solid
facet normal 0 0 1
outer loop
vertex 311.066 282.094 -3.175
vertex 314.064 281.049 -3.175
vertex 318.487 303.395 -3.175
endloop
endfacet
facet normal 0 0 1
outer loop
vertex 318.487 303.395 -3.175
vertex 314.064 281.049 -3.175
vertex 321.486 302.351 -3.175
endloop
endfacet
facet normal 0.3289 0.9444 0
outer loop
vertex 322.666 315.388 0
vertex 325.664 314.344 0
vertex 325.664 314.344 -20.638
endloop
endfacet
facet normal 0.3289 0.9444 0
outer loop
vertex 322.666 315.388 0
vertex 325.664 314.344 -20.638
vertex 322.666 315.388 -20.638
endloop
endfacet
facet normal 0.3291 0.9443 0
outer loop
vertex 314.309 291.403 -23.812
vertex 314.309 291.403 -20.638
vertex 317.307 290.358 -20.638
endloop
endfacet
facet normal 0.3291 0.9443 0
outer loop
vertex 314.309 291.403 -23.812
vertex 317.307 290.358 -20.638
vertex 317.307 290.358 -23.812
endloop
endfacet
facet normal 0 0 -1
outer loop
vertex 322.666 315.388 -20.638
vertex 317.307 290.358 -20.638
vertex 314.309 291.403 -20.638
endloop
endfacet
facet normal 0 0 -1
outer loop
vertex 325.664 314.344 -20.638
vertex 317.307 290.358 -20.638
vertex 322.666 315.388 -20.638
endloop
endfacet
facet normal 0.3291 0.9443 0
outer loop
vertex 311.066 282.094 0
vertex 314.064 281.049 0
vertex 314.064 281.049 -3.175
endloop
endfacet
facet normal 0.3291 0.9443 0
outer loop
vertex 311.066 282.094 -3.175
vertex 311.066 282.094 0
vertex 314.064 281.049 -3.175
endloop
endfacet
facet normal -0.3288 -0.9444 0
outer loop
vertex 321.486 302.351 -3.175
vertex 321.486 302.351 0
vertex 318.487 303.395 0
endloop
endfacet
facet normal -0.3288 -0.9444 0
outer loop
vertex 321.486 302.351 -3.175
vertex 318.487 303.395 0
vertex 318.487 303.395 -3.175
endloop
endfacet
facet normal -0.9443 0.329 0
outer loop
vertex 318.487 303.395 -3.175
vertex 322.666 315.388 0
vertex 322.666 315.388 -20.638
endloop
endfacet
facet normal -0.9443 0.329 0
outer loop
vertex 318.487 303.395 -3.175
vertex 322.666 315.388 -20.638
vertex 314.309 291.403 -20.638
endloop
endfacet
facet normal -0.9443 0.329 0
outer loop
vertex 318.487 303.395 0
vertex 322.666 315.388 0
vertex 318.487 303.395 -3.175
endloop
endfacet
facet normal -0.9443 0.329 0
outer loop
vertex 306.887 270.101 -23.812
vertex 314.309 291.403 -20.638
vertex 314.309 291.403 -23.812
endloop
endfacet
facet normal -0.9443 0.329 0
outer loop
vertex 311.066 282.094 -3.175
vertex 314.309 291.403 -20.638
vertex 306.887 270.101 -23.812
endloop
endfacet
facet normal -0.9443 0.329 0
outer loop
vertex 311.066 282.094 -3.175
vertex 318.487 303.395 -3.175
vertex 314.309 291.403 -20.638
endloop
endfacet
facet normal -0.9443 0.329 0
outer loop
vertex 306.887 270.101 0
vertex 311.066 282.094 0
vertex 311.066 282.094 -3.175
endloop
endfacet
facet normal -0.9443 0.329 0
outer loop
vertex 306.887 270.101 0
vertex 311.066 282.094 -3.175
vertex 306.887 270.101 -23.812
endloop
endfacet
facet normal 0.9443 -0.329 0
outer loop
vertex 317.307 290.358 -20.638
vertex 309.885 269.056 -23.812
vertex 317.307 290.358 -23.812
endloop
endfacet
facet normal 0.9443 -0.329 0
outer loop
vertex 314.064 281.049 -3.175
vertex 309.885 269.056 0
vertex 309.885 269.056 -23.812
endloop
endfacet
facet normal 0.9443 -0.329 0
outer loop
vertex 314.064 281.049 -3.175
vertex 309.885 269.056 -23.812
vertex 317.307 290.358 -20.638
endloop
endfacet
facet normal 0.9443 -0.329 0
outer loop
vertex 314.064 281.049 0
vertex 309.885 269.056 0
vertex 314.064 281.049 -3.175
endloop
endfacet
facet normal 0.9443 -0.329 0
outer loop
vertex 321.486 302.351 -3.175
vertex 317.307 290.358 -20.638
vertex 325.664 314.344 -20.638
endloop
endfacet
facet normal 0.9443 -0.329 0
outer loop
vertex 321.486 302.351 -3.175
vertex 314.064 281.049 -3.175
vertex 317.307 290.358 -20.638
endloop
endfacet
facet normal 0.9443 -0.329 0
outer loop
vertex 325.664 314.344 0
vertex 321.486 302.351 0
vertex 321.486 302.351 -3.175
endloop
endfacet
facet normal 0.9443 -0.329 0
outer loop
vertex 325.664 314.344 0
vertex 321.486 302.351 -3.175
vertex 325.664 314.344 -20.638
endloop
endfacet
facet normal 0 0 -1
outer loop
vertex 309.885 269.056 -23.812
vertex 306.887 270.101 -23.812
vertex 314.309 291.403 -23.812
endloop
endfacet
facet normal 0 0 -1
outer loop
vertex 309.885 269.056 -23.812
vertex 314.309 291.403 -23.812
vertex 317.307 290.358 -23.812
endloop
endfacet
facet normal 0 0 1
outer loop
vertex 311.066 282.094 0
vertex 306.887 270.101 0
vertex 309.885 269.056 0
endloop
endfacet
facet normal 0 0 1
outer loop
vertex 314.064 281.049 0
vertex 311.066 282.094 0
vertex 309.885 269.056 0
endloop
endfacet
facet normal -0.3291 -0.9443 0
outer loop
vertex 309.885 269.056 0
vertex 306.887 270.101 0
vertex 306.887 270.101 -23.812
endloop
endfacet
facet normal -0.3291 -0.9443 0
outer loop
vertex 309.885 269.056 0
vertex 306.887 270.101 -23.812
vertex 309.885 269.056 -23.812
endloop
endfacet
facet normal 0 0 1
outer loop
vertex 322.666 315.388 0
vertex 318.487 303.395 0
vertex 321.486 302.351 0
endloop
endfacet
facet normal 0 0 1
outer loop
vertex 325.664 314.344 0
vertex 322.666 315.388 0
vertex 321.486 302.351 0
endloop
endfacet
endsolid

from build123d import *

# Parameters (mm, degrees)
BOSS_EXTRUDE1_DEPTH = 23.8125
SKETCH2_W           = 3.175
SKETCH2_H           = 25.4
SKETCH2_H_2         = 22.557316078
CUT_EXTRUDE1_DEPTH  = 3.175


with BuildPart() as part:
    # Sketch1 → Boss-Extrude1 (new body)
    with BuildSketch(Plane.XY):
        Polygon((322.665849031, 315.38832698), (306.887039832, 270.101095383), (309.885267674, 269.056463963), (325.664076873, 314.34369556), align=None)
    extrude(amount=-BOSS_EXTRUDE1_DEPTH)

    # Sketch2 → Cut-Extrude1 (cut)
    with BuildSketch(Plane(origin=(192.743701136, -67.155045192, 0), x_dir=(0, 0, -1), z_dir=(0.94432373, -0.32901777, 0))):
        with Locations((22.225, 391.291479466)):
            Rectangle(SKETCH2_W, SKETCH2_H)
        with Locations((1.5875, 380.012821427)):
            Rectangle(SKETCH2_W, SKETCH2_H_2)
    extrude(amount=-CUT_EXTRUDE1_DEPTH, mode=Mode.SUBTRACT)


solid = part.part
